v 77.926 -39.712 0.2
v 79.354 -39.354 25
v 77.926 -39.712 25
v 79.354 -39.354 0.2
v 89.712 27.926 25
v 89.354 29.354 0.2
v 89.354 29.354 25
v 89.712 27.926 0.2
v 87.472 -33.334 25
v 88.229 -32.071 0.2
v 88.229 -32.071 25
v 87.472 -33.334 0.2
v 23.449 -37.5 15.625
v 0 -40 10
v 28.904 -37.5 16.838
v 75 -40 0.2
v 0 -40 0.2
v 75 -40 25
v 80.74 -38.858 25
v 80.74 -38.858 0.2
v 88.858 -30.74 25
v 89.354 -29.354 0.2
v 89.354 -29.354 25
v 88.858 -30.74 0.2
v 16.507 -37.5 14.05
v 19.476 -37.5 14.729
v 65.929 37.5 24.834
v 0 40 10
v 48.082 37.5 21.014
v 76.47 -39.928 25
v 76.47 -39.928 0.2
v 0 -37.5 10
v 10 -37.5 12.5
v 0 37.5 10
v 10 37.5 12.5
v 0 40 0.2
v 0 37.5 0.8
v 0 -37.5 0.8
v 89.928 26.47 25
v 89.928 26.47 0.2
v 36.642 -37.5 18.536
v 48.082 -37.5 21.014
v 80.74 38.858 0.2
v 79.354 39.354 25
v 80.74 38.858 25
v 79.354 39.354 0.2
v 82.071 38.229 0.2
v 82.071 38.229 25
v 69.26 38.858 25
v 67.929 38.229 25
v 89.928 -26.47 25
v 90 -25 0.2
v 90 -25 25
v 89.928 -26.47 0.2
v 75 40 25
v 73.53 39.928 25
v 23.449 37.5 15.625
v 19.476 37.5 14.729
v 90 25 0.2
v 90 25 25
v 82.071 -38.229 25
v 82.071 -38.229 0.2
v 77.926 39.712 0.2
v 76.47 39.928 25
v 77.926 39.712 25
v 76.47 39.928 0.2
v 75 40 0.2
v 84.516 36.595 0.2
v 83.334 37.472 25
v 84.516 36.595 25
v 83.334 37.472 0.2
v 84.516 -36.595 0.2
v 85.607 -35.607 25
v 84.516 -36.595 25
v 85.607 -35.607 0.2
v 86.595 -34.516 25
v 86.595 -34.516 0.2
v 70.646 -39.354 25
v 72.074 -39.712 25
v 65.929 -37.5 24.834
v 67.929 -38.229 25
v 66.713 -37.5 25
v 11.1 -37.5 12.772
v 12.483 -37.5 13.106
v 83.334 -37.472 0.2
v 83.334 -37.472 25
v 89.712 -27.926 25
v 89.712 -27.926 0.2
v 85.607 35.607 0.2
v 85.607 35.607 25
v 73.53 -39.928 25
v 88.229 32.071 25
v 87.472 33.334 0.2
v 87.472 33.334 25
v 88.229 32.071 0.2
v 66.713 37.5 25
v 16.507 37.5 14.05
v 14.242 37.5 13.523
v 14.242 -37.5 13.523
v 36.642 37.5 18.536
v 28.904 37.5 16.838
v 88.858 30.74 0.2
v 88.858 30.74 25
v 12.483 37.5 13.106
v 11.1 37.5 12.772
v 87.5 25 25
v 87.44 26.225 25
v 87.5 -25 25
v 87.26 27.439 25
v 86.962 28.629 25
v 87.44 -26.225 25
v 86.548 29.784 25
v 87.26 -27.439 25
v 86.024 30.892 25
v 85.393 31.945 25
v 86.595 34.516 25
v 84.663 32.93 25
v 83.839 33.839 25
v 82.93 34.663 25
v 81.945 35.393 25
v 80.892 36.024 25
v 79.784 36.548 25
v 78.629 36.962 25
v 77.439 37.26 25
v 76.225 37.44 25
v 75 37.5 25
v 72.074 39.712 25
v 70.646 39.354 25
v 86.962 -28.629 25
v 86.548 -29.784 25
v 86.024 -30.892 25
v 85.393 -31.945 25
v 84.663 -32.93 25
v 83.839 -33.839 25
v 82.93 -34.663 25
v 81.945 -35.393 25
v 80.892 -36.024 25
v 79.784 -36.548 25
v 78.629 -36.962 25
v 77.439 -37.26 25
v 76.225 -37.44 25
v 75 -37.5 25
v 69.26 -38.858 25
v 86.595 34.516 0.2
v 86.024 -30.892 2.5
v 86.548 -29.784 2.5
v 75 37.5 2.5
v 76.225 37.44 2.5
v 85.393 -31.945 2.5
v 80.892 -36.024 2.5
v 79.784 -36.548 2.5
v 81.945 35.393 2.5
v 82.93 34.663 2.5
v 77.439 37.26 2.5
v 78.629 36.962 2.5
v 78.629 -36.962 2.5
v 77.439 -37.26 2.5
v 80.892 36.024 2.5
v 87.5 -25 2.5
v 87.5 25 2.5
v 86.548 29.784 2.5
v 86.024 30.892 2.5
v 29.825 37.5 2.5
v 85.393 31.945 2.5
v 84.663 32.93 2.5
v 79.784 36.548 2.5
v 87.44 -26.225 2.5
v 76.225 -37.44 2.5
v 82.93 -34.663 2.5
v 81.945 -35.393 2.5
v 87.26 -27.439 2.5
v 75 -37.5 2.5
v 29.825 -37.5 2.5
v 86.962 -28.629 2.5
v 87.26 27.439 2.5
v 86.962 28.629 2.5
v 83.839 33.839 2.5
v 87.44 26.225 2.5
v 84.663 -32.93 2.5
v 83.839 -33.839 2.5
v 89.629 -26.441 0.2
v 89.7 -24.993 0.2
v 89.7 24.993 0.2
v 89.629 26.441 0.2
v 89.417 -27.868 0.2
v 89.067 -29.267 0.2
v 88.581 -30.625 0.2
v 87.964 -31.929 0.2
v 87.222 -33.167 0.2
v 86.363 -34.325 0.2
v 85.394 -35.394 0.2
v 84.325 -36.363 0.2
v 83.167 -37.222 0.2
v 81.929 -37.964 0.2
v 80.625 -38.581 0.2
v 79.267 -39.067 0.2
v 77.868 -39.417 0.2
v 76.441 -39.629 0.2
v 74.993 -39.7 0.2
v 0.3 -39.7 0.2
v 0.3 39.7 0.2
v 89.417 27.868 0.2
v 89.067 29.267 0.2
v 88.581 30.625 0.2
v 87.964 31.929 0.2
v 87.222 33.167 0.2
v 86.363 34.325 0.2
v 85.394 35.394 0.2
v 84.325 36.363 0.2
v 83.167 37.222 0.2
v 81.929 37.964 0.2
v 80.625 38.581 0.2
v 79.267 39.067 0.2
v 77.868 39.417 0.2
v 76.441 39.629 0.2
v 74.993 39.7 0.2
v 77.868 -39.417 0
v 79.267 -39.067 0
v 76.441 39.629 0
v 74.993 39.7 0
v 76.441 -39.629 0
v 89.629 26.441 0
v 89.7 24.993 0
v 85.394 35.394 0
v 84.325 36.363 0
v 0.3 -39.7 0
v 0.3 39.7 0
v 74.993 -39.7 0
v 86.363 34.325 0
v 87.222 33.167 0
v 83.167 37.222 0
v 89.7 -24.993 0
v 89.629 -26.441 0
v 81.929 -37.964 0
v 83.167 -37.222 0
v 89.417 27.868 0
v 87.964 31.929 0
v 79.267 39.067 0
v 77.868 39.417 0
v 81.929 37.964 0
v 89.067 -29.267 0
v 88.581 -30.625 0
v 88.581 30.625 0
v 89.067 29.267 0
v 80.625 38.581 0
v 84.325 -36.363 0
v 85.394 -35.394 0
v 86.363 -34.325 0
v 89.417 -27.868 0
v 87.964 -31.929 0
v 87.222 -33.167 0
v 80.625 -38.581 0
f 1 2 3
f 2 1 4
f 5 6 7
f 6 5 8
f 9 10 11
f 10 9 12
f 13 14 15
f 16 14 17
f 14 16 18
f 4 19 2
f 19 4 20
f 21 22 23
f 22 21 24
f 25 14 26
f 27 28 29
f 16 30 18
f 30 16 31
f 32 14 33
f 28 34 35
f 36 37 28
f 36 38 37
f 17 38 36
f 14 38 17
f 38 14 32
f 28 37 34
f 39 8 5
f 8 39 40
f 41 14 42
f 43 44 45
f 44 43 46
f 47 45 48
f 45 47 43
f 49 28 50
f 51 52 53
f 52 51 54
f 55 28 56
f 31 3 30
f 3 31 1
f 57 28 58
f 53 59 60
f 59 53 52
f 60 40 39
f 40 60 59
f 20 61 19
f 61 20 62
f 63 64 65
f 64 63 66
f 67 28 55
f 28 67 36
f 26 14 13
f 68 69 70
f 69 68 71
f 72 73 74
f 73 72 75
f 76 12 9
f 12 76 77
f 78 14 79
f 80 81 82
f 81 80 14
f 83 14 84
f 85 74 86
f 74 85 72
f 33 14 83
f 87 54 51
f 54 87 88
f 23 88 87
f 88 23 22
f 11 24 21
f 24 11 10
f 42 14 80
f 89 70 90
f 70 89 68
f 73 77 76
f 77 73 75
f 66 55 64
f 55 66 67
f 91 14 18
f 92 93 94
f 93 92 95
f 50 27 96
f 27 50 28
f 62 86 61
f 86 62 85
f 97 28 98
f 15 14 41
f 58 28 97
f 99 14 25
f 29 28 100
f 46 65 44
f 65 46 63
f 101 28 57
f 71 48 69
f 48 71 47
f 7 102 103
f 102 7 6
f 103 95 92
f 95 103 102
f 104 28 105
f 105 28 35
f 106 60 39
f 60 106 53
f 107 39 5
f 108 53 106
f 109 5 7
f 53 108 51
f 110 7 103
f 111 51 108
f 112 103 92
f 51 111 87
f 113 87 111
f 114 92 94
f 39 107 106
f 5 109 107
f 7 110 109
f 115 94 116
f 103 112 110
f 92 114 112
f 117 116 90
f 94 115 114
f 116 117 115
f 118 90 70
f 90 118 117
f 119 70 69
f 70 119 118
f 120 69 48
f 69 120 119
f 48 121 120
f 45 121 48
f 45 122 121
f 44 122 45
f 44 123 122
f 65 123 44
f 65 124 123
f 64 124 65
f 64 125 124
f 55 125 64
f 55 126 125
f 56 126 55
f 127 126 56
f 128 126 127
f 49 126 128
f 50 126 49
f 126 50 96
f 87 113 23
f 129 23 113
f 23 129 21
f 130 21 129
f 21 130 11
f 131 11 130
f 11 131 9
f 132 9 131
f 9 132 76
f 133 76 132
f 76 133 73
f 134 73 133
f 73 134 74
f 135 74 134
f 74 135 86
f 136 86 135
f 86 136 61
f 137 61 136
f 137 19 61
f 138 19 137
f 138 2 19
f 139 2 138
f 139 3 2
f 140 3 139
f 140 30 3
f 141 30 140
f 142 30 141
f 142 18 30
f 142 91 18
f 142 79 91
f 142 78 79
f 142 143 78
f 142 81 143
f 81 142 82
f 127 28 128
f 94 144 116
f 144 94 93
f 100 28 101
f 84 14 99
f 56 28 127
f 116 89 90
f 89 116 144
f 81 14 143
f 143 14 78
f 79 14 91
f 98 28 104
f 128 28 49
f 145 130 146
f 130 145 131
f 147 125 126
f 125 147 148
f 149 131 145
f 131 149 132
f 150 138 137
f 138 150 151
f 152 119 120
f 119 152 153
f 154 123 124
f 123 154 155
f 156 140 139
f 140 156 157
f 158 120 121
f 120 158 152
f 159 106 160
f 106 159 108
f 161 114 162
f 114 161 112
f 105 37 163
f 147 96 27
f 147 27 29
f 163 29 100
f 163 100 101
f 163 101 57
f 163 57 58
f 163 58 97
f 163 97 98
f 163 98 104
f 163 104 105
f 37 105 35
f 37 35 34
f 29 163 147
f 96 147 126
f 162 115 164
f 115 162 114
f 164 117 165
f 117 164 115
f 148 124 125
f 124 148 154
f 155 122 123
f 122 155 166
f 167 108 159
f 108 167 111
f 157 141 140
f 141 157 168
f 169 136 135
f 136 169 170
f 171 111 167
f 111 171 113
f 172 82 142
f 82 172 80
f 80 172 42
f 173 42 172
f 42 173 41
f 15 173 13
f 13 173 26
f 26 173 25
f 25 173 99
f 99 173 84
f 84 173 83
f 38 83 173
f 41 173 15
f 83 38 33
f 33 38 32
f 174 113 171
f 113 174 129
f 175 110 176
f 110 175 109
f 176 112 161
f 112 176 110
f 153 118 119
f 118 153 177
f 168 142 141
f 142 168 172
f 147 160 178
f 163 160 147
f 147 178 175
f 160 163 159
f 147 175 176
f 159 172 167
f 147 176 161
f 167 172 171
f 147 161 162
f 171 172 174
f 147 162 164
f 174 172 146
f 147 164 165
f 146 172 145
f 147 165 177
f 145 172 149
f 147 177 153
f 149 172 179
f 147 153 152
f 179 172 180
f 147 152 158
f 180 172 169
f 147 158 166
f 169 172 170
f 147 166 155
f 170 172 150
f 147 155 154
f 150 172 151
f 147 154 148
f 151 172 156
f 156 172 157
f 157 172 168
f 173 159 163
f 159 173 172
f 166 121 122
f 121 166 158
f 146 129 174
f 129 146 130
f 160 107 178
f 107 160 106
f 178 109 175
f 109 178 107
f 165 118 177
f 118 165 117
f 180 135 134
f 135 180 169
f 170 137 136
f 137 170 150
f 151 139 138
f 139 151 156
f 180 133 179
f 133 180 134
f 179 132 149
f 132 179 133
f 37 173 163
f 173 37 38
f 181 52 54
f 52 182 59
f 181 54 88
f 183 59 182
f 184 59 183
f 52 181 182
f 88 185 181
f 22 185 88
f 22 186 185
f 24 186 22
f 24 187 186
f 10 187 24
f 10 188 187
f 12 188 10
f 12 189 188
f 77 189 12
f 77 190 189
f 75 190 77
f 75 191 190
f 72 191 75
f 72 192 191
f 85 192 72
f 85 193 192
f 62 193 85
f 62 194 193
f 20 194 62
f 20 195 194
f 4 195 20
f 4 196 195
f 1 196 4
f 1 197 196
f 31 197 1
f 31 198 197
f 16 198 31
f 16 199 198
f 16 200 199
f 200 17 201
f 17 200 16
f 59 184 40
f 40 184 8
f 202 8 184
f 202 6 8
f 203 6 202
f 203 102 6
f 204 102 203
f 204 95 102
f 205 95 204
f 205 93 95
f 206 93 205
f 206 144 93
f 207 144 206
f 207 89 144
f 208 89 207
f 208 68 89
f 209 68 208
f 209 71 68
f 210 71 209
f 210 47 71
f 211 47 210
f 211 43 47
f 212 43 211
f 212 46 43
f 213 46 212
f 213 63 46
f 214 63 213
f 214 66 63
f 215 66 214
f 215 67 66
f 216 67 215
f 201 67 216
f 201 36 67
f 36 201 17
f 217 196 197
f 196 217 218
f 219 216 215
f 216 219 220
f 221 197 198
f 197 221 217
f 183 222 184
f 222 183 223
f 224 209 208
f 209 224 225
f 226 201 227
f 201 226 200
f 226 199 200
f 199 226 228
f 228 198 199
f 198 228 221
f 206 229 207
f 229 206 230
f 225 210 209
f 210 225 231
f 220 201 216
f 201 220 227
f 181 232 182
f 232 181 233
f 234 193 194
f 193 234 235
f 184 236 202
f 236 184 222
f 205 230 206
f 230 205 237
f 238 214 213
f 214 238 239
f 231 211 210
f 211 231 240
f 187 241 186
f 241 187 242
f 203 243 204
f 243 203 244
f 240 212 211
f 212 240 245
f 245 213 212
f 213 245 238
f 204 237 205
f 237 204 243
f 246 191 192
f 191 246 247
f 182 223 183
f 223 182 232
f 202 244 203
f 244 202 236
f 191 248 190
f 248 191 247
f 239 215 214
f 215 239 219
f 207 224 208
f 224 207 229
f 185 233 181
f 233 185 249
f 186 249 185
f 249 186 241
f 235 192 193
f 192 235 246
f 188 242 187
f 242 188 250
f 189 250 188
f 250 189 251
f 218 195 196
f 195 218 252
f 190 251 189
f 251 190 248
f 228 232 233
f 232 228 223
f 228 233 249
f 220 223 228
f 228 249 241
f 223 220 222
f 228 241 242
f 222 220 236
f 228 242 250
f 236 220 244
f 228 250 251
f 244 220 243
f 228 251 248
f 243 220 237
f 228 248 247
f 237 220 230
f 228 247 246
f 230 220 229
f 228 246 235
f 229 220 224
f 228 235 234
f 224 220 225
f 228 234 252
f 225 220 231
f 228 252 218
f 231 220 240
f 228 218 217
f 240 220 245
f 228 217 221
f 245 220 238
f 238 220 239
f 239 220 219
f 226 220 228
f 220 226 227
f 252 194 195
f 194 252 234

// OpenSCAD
$fn=64;

// Width at the opening, includes wall thickness.
width = 80;
// Length including wall thickness.
length = 90;
// Wall height at the closed end
height = 25;
// Wall height at the open end.
front_height = 10;
// Radius of the two corners at the closed end.
corner_radius=15;
// Wall thickness
wall_thickness = 2.5;
// Base thickness
base_thickness = 2.5;
// Reduced base thickness at the open end.
slope_height = 0.8;
// Length of base slope at the open end.
slope_length = 30;
// Inset first layer by this dimension (0 to disable). Helps prevnting
// 'elephant foot' syndrom.
first_layer_inset_width = 0.3;
// Height of first layer. Ignored if first_layer_inset_width is zero or negative.
first_layer_inset_height = 0.2;

eps1 = 0.01 + 0;  // hide on thingiverse customizer.
eps2 = 2*eps1;


module block() {
  hull() {
    translate([length-corner_radius, width/2-corner_radius, 0]) 
        cylinder(r=corner_radius, h=height);
    translate([length-corner_radius, -(width/2-corner_radius), 0]) 
        cylinder(r=corner_radius, h=height);
    
    translate([0, -width/2, 0]) cube([eps1, width, front_height]);
  }
}

module hollow() {
  w = width - 2*wall_thickness;
  l = length - wall_thickness;
  r = corner_radius - wall_thickness;
  
  hull() {
    translate([l-r, w/2-r, base_thickness]) 
        cylinder(r=r, h=height);
    translate([l-r, -(w/2-r), base_thickness]) 
        cylinder(r=r, h=height);
    translate([-eps1, -w/2, base_thickness]) cube([eps1, w, height]);
  }
}

module slope() {
  w = width - 2*wall_thickness;
  hull() {
    translate([-eps1, -w/2, slope_height]) 
        cube([eps1, w, height]);
    translate([slope_length-eps1, -w/2, base_thickness+eps1]) 
        cube([eps1, w, height]);
  }
}

module main() {
  difference() {
    block();
    hollow();
    slope();
  }
}

// Inset first layer to eliminate elephant foot.
module main_with_first_layer_inset() {
  difference() {
    main();  
    cube([200, 200, 2*first_layer_inset_height], center=true);
  }
  linear_extrude(height=first_layer_inset_height+eps1) 
    offset(r = -first_layer_inset_width) 
      projection(cut=true) 
        main();  // <<====
}

if (first_layer_inset_width > 0) {
  main_with_first_layer_inset();
} else {
  main();
}
  
